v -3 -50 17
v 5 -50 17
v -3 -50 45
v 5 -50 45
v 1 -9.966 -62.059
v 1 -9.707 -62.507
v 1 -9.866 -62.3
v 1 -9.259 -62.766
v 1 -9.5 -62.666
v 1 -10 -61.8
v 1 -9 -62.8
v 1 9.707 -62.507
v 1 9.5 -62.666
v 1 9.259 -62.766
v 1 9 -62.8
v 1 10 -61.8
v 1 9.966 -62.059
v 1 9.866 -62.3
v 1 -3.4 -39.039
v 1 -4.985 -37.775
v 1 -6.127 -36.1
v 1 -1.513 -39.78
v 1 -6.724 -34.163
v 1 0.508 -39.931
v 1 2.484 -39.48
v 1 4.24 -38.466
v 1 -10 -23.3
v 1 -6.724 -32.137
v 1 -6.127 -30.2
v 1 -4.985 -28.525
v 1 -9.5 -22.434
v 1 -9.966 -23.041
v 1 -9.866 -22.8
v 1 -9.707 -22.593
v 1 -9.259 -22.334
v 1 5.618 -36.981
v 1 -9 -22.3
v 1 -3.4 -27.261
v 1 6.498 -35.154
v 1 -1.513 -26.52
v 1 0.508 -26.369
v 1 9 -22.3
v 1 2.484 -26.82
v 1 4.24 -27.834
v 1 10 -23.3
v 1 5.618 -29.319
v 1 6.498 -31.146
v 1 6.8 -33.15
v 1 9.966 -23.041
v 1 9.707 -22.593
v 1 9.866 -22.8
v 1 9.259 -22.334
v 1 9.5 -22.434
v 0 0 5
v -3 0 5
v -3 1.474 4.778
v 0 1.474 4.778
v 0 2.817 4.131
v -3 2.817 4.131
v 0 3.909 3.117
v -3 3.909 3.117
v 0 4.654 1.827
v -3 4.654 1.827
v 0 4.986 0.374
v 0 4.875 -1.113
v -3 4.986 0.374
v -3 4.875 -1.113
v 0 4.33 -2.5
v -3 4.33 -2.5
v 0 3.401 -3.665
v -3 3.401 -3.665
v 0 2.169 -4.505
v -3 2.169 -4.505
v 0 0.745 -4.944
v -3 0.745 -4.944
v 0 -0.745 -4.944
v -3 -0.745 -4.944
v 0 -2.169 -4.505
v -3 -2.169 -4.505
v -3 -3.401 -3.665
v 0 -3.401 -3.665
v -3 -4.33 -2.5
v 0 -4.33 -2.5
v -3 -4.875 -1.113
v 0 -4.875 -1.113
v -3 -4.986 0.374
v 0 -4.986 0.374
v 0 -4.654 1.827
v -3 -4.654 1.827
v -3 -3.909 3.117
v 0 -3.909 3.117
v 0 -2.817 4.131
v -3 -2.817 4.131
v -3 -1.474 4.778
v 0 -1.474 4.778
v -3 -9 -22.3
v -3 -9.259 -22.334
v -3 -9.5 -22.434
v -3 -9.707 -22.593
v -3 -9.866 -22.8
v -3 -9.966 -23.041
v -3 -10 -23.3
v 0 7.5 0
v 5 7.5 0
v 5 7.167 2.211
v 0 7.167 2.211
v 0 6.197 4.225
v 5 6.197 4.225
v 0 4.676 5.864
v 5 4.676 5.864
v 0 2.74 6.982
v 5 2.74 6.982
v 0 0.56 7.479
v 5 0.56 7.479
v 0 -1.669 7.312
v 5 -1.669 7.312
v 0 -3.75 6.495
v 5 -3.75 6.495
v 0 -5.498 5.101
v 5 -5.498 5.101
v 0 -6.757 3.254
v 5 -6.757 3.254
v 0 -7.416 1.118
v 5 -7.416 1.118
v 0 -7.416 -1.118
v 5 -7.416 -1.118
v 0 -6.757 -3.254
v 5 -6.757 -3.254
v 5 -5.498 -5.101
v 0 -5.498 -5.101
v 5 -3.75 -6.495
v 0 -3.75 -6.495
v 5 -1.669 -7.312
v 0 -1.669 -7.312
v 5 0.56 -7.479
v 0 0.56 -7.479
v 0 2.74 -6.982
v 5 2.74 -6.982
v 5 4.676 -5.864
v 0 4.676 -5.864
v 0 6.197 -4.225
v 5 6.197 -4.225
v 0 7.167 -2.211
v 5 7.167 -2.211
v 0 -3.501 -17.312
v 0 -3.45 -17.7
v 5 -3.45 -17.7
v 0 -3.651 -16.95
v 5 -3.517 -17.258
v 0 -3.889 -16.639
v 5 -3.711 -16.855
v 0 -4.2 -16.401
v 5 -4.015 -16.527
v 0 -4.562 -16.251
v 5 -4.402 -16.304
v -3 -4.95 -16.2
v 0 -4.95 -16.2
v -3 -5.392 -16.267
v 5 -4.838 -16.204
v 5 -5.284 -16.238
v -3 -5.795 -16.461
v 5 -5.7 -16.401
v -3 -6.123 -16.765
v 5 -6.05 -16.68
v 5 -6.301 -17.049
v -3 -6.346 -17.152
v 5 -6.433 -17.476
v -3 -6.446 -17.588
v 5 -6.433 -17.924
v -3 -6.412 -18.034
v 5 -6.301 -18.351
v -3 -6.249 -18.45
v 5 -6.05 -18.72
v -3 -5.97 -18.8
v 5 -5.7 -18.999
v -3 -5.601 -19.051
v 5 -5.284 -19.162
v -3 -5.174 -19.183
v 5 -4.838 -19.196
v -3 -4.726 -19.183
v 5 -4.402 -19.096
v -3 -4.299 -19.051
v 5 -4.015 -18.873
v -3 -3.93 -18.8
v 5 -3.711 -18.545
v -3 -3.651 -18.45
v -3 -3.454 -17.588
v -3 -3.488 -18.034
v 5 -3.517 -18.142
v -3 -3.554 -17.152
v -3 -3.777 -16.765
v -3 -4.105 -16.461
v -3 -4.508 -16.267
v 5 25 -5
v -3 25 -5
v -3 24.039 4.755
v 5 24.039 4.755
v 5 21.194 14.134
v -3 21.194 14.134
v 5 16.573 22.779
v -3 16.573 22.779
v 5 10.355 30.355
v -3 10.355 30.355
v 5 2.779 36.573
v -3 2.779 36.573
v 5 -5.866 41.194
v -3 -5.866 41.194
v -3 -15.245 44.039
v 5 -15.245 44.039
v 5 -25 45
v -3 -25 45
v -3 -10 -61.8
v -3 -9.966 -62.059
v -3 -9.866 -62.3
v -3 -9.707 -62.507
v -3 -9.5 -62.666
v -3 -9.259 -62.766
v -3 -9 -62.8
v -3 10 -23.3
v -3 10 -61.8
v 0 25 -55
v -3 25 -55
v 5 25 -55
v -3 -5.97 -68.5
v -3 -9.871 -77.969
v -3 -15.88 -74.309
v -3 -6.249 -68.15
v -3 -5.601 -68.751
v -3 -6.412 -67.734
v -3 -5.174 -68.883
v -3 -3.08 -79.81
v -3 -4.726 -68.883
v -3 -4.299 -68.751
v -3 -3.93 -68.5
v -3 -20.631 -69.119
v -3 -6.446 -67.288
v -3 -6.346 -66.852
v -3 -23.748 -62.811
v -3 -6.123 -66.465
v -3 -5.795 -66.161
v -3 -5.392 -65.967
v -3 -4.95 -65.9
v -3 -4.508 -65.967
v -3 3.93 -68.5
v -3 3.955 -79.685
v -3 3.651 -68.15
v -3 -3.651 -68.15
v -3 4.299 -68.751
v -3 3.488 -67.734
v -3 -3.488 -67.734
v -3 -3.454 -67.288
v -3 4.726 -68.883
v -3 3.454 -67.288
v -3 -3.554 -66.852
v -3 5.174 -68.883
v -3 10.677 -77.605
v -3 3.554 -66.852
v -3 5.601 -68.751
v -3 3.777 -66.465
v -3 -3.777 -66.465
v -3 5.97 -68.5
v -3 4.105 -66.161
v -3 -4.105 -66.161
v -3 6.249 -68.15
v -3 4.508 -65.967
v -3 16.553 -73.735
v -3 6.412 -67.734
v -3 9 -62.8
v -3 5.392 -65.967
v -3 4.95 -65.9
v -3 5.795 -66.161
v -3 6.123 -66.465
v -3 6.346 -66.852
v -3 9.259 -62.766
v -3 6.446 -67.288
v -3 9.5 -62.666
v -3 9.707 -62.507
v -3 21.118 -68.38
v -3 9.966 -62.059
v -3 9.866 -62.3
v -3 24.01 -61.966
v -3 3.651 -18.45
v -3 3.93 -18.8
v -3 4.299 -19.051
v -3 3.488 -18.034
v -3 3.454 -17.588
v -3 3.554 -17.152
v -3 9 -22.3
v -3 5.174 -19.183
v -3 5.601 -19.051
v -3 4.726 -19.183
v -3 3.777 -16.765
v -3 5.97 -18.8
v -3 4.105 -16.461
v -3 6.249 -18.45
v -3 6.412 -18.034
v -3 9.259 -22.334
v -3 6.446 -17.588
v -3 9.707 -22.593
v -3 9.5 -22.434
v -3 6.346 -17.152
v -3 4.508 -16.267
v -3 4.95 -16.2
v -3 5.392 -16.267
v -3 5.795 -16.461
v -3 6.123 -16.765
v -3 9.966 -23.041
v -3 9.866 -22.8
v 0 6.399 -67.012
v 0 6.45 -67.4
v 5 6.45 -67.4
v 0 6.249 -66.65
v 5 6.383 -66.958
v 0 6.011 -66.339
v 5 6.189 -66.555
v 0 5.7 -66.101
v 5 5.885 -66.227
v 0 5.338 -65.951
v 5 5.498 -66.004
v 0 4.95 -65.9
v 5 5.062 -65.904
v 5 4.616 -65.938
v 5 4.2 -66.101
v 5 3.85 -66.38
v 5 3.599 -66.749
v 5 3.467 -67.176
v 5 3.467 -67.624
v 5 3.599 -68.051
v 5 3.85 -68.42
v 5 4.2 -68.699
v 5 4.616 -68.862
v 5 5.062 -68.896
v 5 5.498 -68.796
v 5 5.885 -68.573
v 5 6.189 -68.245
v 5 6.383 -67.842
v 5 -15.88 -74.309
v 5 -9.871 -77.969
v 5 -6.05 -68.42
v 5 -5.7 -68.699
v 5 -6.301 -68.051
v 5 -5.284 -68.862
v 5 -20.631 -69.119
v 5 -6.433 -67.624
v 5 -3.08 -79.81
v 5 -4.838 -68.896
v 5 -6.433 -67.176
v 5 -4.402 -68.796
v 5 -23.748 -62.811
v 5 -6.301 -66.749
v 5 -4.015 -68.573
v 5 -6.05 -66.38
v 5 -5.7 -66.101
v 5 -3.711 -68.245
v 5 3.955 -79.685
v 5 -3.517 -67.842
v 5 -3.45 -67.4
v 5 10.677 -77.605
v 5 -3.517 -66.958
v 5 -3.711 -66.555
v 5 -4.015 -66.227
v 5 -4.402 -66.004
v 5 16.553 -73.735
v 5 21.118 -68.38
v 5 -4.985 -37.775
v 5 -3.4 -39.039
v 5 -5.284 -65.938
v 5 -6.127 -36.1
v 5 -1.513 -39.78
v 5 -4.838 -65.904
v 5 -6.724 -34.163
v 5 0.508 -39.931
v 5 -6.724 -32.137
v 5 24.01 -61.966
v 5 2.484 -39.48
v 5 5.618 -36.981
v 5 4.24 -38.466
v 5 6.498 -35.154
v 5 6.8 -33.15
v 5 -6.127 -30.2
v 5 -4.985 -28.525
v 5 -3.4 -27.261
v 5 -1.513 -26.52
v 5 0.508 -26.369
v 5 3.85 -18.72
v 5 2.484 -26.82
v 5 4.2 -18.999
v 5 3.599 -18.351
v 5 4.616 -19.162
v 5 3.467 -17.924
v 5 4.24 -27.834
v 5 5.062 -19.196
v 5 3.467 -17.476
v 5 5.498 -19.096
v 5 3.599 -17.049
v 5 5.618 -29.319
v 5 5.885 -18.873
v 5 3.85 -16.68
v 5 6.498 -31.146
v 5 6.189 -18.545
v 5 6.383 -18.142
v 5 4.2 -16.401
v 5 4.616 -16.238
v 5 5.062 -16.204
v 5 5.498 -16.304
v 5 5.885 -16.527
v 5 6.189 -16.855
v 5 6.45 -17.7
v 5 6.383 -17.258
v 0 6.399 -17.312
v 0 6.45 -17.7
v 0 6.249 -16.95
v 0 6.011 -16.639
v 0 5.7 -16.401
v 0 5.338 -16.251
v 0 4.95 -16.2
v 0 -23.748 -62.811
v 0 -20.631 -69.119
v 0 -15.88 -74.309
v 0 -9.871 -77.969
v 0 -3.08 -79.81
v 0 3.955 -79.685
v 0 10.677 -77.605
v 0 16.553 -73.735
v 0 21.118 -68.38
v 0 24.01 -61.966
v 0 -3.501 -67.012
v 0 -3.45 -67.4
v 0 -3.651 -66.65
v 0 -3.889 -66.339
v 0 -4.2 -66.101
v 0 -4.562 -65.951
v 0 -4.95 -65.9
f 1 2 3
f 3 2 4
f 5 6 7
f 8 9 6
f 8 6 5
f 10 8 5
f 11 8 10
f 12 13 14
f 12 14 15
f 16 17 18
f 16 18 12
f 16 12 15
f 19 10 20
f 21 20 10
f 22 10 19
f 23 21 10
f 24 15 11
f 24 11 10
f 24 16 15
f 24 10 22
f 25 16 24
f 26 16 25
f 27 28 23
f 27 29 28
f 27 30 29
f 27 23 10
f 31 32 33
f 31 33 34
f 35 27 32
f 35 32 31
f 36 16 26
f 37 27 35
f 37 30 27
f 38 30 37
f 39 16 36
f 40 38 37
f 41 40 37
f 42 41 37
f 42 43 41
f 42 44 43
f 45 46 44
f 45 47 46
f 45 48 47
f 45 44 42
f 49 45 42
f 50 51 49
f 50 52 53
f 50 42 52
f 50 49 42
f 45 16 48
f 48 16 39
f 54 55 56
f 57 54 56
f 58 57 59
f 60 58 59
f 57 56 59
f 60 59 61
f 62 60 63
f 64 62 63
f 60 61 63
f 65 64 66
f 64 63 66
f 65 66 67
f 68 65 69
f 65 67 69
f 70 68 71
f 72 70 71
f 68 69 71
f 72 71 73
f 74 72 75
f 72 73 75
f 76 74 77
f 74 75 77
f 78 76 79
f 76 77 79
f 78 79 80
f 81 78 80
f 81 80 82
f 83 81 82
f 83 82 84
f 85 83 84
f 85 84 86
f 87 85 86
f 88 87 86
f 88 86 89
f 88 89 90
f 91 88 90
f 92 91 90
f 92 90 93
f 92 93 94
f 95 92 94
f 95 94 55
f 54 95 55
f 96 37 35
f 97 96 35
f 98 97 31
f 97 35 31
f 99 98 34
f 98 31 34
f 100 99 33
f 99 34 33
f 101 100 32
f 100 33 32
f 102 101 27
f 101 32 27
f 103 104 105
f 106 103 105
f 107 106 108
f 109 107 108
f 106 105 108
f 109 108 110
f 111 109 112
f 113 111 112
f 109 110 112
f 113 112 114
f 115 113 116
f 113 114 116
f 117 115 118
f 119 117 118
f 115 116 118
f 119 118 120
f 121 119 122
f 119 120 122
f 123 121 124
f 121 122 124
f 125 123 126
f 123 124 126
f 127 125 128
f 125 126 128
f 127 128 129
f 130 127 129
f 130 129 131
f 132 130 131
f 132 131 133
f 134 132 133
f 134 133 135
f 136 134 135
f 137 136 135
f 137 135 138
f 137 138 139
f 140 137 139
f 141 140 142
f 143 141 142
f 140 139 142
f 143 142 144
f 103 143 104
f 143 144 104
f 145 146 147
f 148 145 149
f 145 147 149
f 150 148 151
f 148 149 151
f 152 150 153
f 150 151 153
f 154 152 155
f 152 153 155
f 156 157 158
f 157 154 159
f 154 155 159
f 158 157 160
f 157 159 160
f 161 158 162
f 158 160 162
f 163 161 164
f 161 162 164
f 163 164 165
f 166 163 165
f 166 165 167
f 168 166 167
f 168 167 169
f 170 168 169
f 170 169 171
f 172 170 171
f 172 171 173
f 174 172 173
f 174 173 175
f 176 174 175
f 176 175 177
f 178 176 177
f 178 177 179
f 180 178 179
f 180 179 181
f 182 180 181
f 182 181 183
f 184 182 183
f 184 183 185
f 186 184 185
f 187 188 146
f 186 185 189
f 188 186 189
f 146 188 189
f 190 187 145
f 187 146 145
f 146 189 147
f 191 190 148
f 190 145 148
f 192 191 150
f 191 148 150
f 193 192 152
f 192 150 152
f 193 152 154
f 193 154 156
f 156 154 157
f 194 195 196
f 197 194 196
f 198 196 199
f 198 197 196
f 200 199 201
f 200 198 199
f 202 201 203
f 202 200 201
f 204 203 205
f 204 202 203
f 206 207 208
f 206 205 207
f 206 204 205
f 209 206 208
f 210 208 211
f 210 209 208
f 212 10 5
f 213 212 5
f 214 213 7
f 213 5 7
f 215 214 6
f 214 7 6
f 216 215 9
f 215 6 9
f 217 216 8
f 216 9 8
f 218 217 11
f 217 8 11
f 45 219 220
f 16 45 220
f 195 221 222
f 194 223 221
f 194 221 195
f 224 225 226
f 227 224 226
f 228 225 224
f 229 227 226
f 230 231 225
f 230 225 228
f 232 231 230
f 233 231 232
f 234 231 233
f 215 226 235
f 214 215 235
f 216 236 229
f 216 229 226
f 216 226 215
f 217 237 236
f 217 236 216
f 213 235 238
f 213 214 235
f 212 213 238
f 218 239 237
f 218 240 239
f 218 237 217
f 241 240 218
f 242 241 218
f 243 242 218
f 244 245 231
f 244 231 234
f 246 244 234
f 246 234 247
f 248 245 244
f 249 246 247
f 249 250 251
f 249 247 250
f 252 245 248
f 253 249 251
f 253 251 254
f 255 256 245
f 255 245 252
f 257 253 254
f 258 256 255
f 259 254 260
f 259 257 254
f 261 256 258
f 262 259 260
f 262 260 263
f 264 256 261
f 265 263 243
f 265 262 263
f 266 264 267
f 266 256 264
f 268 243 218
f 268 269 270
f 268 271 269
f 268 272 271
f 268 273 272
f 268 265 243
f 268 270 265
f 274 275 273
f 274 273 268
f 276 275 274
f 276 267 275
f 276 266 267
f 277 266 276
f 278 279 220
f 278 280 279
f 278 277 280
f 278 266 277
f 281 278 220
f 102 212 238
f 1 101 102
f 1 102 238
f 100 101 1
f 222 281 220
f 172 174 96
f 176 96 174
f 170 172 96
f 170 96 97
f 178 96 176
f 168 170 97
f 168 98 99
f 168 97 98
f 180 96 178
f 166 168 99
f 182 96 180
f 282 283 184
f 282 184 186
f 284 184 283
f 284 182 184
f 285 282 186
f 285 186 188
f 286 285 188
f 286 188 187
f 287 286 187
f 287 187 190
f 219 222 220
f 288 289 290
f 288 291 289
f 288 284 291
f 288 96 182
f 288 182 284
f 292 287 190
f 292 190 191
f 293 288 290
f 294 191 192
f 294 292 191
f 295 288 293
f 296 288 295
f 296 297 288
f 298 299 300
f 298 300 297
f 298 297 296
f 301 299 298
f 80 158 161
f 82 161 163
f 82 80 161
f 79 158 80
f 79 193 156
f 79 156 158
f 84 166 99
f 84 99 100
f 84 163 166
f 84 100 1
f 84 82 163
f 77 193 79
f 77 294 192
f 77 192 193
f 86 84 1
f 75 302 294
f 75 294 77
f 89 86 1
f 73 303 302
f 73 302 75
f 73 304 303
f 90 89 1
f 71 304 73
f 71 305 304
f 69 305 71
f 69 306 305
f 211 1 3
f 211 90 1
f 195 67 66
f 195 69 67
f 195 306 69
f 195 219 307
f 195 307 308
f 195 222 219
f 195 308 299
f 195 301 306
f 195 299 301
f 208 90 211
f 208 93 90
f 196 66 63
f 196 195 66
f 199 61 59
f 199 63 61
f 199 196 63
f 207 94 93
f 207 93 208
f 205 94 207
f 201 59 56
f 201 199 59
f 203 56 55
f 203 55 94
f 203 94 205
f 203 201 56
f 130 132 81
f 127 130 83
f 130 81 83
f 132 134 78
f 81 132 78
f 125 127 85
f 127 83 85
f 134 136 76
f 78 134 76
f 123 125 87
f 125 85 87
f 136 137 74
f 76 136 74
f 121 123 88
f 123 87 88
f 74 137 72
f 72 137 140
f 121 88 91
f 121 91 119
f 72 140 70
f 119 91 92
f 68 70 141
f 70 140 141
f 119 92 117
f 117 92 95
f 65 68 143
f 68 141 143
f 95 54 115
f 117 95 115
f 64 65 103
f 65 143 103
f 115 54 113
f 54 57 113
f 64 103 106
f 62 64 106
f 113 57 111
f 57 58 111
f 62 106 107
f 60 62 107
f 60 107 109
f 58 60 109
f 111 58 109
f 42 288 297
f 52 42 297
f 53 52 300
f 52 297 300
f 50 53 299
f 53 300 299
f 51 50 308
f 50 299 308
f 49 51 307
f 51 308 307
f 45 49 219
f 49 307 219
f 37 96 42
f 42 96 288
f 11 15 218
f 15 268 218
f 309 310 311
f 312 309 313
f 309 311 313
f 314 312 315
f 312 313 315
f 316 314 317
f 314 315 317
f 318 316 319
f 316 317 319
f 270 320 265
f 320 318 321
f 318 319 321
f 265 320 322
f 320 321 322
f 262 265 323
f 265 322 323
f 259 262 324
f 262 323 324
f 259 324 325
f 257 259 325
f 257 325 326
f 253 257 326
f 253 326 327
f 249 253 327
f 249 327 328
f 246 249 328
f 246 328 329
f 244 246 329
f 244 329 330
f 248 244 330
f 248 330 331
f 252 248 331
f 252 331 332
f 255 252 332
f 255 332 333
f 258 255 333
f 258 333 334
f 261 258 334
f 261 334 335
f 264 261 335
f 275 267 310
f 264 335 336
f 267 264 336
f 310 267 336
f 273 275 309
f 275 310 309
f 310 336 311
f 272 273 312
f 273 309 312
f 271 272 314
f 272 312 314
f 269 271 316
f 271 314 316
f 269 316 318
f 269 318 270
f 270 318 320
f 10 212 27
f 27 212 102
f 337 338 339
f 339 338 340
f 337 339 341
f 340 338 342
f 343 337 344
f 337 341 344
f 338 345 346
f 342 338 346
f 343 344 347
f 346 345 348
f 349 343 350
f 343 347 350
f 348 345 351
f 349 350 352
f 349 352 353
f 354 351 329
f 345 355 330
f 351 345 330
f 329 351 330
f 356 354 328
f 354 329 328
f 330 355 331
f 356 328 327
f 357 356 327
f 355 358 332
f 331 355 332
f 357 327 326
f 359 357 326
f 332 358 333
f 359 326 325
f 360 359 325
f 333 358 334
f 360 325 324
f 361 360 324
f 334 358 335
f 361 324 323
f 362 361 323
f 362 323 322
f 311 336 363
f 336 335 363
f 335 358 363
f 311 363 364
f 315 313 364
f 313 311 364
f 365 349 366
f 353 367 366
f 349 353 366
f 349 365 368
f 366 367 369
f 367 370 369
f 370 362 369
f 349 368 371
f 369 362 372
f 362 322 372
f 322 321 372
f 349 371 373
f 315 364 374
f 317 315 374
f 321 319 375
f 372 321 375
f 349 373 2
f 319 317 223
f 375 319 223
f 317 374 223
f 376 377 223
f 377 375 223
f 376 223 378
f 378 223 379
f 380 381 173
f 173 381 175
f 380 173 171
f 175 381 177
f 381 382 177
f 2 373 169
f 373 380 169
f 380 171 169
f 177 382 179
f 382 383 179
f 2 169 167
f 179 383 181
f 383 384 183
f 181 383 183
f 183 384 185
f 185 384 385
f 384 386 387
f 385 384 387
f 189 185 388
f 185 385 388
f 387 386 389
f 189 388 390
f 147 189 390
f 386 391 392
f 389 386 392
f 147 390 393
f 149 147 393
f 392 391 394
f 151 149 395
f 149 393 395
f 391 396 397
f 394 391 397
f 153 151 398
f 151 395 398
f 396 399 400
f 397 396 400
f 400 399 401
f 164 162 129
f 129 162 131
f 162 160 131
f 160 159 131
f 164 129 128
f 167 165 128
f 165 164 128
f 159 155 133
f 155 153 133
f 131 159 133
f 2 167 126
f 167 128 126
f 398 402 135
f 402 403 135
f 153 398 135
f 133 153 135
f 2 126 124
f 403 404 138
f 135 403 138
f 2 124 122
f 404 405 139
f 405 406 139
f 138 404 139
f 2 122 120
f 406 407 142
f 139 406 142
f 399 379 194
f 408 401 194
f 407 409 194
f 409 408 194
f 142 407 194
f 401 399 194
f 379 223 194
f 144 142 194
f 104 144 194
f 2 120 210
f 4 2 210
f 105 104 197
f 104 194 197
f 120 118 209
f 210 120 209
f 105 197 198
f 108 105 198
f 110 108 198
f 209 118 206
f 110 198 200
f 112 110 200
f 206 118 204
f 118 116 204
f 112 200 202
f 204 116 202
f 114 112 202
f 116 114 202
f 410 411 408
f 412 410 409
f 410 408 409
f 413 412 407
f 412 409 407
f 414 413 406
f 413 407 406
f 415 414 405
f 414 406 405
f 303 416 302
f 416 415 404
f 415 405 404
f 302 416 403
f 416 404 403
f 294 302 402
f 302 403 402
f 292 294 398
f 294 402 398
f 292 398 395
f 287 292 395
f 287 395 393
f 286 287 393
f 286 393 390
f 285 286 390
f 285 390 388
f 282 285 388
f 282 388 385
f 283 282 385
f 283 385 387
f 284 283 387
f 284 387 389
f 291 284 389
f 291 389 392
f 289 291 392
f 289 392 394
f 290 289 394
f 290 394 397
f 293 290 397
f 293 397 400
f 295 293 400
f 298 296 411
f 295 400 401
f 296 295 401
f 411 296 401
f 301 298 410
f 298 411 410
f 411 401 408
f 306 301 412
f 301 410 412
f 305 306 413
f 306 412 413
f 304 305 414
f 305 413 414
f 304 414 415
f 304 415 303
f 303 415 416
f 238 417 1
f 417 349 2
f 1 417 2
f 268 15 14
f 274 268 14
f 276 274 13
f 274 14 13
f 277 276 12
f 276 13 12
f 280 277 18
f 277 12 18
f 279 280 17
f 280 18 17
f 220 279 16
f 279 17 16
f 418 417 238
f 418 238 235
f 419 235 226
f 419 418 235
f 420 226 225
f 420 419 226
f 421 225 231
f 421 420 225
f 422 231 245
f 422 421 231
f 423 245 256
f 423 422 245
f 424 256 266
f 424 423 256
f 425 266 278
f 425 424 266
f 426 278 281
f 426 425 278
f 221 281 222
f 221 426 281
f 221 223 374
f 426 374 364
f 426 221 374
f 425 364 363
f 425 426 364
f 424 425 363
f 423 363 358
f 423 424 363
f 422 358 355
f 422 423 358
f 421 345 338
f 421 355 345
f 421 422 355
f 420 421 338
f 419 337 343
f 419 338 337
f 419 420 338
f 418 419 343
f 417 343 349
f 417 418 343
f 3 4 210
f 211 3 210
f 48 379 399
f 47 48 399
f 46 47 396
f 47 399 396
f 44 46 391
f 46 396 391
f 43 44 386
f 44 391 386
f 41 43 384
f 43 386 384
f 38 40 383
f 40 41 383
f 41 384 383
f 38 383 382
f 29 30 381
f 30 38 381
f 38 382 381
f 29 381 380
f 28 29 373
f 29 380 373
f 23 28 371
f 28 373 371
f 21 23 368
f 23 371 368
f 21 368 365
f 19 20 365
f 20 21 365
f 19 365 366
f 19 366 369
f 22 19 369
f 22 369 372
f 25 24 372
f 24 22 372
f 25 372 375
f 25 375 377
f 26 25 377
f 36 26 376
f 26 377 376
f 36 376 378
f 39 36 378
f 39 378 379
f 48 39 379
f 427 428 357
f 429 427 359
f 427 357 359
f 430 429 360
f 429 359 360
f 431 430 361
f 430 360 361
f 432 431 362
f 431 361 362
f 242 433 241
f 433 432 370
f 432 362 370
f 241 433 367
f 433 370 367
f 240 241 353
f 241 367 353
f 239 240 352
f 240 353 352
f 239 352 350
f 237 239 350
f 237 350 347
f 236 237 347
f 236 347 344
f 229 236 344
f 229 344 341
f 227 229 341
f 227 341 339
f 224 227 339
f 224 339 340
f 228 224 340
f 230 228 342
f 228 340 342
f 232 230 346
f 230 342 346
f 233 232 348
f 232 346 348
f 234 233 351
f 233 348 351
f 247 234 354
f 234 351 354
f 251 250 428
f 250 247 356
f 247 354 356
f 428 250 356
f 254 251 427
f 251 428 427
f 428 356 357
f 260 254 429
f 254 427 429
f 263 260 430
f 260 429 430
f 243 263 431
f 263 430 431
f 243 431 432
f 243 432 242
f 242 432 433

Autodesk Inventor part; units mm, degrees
ref_plane "YZ Plane" through (0, 0, 0) normal (1, 0, 0) x (0, 1, 0)
ref_plane "XZ Plane" through (0, 0, 0) normal (0, 1, 0) x (-1, 0, 0)
ref_plane "XY Plane" through (0, 0, 0) normal (0, 0, 1) x (1, 0, 0)
sketch "Sketch1" plane through (0, 0, 0) normal (1, 0, 0) x (0, 1, 0)
  circle A0 centre (0, 0) radius 16.575
  line L0 (0, 16.575) -> (0, -49.725)
  line L1 (0, -33.15) -> (0, -15.05)
  line L2 (0, -15.05) -> (0, -70.05)
  line L3 (10, -70.05) -> (-10, -70.05)
  line L4 (-10, -70.05) -> (-10, -15.05)
  line L5 (-10, -15.05) -> (10, -15.05)
  line L6 (10, -15.05) -> (10, -70.05)
  line L7 (10, -70.05) -> (-10, -15.05) construction
  line L8 (-10, -70.05) -> (10, -15.05) construction
  line L9 (10, -62.65) -> (-10, -62.65)
  line L10 (-10, -62.65) -> (-10, -22.45)
  line L11 (-10, -22.45) -> (10, -22.45)
  line L12 (10, -22.45) -> (10, -62.65)
  line L13 (10, -62.65) -> (-10, -22.45) construction
  line L14 (-10, -62.65) -> (10, -22.45) construction
  line L15 (-4.95, -27.2) -> (-4.95, -17.7)
  line L16 (-4.95, -17.7) -> (4.95, -17.7)
  line L17 (4.95, -27.2) -> (-4.95, -17.7) construction
  line L18 (-4.95, -27.2) -> (4.95, -17.7) construction
  line L19 (4.95, -67.4) -> (-4.95, -67.4)
  line L20 (-4.95, -67.4) -> (-4.95, -57.9)
  line L21 (-4.95, -57.9) -> (4.95, -57.9)
  line L22 (4.95, -67.4) -> (-4.95, -57.9) construction
  line L23 (-4.95, -67.4) -> (4.95, -57.9) construction
  circle A1 centre (4.95, -17.7) radius 1.5
  circle A2 centre (-4.95, -17.7) radius 1.5
  circle A3 centre (4.95, -67.4) radius 1.5
  circle A4 centre (-4.95, -67.4) radius 1.5
  circle A5 centre (0, -33.15) radius 6.8
  line L24 (0, -80) -> (0, -55)
  arc A6 (-25, -55) -> (25, -55) centre (0, -55) ccw
  line L25 (0, 0) -> (0, 45)
  line L26 (25, 45) -> (-25, 45)
  line L27 (25, 45) -> (25, -55)
  line L28 (-25, 45) -> (-25, -55)
  circle A7 centre (0, 0) radius 7.5
  point P0 (0, -42.55)
  point P1 (0, -42.55)
  point P2 (0, -22.45)
  point P3 (0, -62.65)
  dimension "d0" = 33.15
  dimension "d2" = 66.3
  dimension "d4" = 18.1
  dimension "d5" = 55
  dimension "d6" = 20
  dimension "d7" = 55
  dimension "d8" = 40.2
  dimension "d9" = 9.9
  dimension "d10" = 9.5
  dimension "d11" = 9.9
  dimension "d12" = 9.5
  dimension "d13" = 3
  dimension "d14" = 3
  dimension "d15" = 3
  dimension "d16" = 3
  dimension "d17" = 13.6
  dimension "d20" = 25
  dimension "d21" = 45
  dimension "d22" = 15
extrude "Extrusion1" add sketch "Sketch1" along normal blind 5 contours A0 L5 L0 A7 | A0 L25 L26 L27 A6 L24 L3 L6 L5 | L0 A7 L5 A0 | A0 L5 L4 L3 L24 A6 L28 L26 L25 | L5 L6 L11 L0 A0 | A0 L0 L5 | L5 L0 A0 | A0 L0 L16 A2 L15 L11 L4 L5 | L0 L11 L15 A2 L16 | L6 L9 L2 L0 A5 L11 | L11 L0 A5 L2 L21 L20 L9 L4 | L6 L3 L2 L9 | L9 L20 A4 L19 L2 L3 L4 | L9 L20 L21 L2 | L2 L19 A4 L20 L9
sketch "Sketch2" plane through (0, 0, 0) normal (-1, 0, 0) x (0, 0, 1)
  line L0 (45, 25) -> (45, -25) projected
  line L1 (-55, 25) -> (45, 25) projected
  line L2 (45, 25) -> (-5, 25)
  line L3 (45, 25) -> (45, -25)
  arc A0 (45, -25) -> (-5, 25) centre (-5, -25) ccw
extrude "Extrusion2" cut sketch "Sketch2" against normal blind 5
sketch "Sketch3" plane through (0, 0, 0) normal (-1, 0, 0) x (0, 0, 1)
  arc A0 (45, -25) -> (-5, 25) centre (-5, -25) ccw projected
  arc A1 (-55, 25) -> (-55, -25) centre (-55, 0) ccw projected
  line L0 (45, -25) -> (-55, -25) projected
  line L1 (45, -25) -> (45, -50)
  line L2 (45, -50) -> (17, -50)
  line L3 (17, -50) -> (-62.8113, -23.7483)
  line L4 (45, -25) -> (-55, -25)
  arc A2 (-62.8113, -23.7483) -> (-55, -25) centre (-55, 0) ccw
  dimension "d27" = 25
  dimension "d28" = 28
extrude "Extrusion3" add sketch "Sketch3" against normal blind 5
sketch "Sketch4" plane through (0, 0, 0) normal (-1, 0, 0) x (0, 0, 1)
  circle A0 centre (0, 0) radius 7.5 projected
  arc A1 (45, -25) -> (-5, 25) centre (-5, -25) ccw projected
  line L0 (-55, 25) -> (-5, 25) projected
  arc A2 (-55, 25) -> (-62.8113, -23.7483) centre (-55, 0) ccw projected
  line L1 (-62.8113, -23.7483) -> (17, -50) projected
  line L2 (17, -50) -> (45, -50) projected
  line L3 (45, -50) -> (45, -25) projected
  circle A3 centre (-33.15, 0) radius 6.8 projected
  circle A4 centre (-67.4, -4.95) radius 1.5 projected
  circle A5 centre (-67.4, 4.95) radius 1.5 projected
  circle A6 centre (-17.7, -4.95) radius 1.5 projected
  circle A7 centre (-17.7, 4.95) radius 1.5 projected
extrude "Extrusion4" add sketch "Sketch4" along normal blind 3
sketch "Sketch5" plane through (-3, 0, 0) normal (-1, 0, 0) x (0, 0, 1)
  circle A0 centre (-33.15, 0) radius 6.8 projected
  circle A1 centre (-17.7, -4.95) radius 1.5 projected
  circle A2 centre (-67.4, 4.95) radius 1.5 projected
  line L0 (-67.4, 4.95) -> (-17.7, 4.95)
  line L1 (-17.7, 4.95) -> (-17.7, -4.95)
  line L2 (-17.7, -4.95) -> (-67.4, -4.95)
  line L3 (-67.4, -4.95) -> (-67.4, 4.95)
  line L4 (-67.4, 0) -> (-17.7, 0)
  line L5 (-22.3, 10) -> (-62.8, 10)
  line L6 (-62.8, 10) -> (-62.8, -10)
  line L7 (-62.8, -10) -> (-22.3, -10)
  line L8 (-22.3, -10) -> (-22.3, 10)
  line L9 (-22.3, 10) -> (-62.8, -10) construction
  line L10 (-62.8, 10) -> (-22.3, -10) construction
  point P0 (-42.55, 0)
  dimension "d33" = 40.5
  dimension "d34" = 20
extrude "Extrusion5" cut sketch "Sketch5" against normal blind 3 contours L4 L8 L2 A0 | A0 L0 L8 L4 | A0 L0 L6 L5 L8 | L2 L8 L7 L6 A0 | L4 L6 L0 A0 | A0 L2 L6 L4
sketch "Sketch6" plane through (0, 0, 0) normal (-1, 0, 0) x (0, 0, 1)
  circle A0 centre (-33.15, 0) radius 6.8 projected
  line L0 (-62.8, 10) -> (-22.3, 10) projected
  line L1 (-62.8, -10) -> (-62.8, 10) projected
  line L2 (-22.3, -10) -> (-62.8, -10) projected
  line L3 (-22.3, 10) -> (-22.3, -10) projected
  point P0 (0, 0)
extrude "Extrusion6" cut sketch "Sketch6" against normal blind 1
sketch "Sketch7" plane through (-3, 0, 0) normal (-1, 0, 0) x (0, 0, 1)
  circle A0 centre (0, 0) radius 7.5 projected
  circle A1 centre (0, 0) radius 5
  dimension "d39" = 10
extrude "Extrusion7" add sketch "Sketch7" against normal blind 3
fillet "Fillet1" radius 1 4 edges at (-1, -10, -22.3) (-1, 10, -22.3) (-1, 10, -62.8) (-1, -10, -62.8)
properties part number "packa_strana(a)"
